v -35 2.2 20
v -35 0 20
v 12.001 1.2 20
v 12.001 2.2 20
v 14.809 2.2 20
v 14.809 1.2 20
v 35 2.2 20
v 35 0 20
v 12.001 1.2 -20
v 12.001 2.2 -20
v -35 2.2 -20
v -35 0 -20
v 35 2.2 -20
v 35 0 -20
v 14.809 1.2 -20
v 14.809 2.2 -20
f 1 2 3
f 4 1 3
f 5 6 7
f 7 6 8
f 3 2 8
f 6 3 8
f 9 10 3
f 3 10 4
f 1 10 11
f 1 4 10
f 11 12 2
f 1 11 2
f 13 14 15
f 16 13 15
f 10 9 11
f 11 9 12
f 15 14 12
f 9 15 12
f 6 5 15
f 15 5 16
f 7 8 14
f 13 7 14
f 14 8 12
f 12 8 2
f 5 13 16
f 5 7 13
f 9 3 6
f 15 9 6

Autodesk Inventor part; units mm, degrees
ref_plane "YZ Plane" through (0, 0, 0) normal (1, 0, 0) x (0, 1, 0)
ref_plane "XZ Plane" through (0, 0, 0) normal (0, 1, 0) x (-1, 0, 0)
ref_plane "XY Plane" through (0, 0, 0) normal (0, 0, 1) x (1, 0, 0)
sketch "Эскиз1" plane through (0, 0, 0) normal (0, 1, 0) x (-1, 0, 0)
  line L0 (-35, -20) -> (35, -20)
  line L1 (35, -20) -> (35, 20)
  line L2 (35, 20) -> (-35, 20)
  line L3 (-35, 20) -> (-35, -20)
  line L4 (-35, -20) -> (35, 20) construction
  line L5 (35, -20) -> (-35, 20) construction
  point P0 (0, 0)
  dimension "d0" = 70
  dimension "d1" = 40
extrude "Выдавливание1" add sketch "Эскиз1" along normal blind 2.2
sketch "Эскиз2" plane through (0, 2.2, 0) normal (0, 1, 0) x (1, 0, 0)
  line L0 (-35, -20) -> (35, -20) projected
  line L1 (35, 20) -> (-35, 20) projected
  line L2 (12.0013, -20) -> (14.8088, -20)
  line L3 (14.8088, -20) -> (14.8088, 20)
  line L4 (14.8088, 20) -> (12.0013, 20)
  line L5 (12.0013, 20) -> (12.0013, -20)
  point P0 (0, 0)
extrude "Выдавливание2" cut sketch "Эскиз2" against normal blind 1
properties part number "test"
